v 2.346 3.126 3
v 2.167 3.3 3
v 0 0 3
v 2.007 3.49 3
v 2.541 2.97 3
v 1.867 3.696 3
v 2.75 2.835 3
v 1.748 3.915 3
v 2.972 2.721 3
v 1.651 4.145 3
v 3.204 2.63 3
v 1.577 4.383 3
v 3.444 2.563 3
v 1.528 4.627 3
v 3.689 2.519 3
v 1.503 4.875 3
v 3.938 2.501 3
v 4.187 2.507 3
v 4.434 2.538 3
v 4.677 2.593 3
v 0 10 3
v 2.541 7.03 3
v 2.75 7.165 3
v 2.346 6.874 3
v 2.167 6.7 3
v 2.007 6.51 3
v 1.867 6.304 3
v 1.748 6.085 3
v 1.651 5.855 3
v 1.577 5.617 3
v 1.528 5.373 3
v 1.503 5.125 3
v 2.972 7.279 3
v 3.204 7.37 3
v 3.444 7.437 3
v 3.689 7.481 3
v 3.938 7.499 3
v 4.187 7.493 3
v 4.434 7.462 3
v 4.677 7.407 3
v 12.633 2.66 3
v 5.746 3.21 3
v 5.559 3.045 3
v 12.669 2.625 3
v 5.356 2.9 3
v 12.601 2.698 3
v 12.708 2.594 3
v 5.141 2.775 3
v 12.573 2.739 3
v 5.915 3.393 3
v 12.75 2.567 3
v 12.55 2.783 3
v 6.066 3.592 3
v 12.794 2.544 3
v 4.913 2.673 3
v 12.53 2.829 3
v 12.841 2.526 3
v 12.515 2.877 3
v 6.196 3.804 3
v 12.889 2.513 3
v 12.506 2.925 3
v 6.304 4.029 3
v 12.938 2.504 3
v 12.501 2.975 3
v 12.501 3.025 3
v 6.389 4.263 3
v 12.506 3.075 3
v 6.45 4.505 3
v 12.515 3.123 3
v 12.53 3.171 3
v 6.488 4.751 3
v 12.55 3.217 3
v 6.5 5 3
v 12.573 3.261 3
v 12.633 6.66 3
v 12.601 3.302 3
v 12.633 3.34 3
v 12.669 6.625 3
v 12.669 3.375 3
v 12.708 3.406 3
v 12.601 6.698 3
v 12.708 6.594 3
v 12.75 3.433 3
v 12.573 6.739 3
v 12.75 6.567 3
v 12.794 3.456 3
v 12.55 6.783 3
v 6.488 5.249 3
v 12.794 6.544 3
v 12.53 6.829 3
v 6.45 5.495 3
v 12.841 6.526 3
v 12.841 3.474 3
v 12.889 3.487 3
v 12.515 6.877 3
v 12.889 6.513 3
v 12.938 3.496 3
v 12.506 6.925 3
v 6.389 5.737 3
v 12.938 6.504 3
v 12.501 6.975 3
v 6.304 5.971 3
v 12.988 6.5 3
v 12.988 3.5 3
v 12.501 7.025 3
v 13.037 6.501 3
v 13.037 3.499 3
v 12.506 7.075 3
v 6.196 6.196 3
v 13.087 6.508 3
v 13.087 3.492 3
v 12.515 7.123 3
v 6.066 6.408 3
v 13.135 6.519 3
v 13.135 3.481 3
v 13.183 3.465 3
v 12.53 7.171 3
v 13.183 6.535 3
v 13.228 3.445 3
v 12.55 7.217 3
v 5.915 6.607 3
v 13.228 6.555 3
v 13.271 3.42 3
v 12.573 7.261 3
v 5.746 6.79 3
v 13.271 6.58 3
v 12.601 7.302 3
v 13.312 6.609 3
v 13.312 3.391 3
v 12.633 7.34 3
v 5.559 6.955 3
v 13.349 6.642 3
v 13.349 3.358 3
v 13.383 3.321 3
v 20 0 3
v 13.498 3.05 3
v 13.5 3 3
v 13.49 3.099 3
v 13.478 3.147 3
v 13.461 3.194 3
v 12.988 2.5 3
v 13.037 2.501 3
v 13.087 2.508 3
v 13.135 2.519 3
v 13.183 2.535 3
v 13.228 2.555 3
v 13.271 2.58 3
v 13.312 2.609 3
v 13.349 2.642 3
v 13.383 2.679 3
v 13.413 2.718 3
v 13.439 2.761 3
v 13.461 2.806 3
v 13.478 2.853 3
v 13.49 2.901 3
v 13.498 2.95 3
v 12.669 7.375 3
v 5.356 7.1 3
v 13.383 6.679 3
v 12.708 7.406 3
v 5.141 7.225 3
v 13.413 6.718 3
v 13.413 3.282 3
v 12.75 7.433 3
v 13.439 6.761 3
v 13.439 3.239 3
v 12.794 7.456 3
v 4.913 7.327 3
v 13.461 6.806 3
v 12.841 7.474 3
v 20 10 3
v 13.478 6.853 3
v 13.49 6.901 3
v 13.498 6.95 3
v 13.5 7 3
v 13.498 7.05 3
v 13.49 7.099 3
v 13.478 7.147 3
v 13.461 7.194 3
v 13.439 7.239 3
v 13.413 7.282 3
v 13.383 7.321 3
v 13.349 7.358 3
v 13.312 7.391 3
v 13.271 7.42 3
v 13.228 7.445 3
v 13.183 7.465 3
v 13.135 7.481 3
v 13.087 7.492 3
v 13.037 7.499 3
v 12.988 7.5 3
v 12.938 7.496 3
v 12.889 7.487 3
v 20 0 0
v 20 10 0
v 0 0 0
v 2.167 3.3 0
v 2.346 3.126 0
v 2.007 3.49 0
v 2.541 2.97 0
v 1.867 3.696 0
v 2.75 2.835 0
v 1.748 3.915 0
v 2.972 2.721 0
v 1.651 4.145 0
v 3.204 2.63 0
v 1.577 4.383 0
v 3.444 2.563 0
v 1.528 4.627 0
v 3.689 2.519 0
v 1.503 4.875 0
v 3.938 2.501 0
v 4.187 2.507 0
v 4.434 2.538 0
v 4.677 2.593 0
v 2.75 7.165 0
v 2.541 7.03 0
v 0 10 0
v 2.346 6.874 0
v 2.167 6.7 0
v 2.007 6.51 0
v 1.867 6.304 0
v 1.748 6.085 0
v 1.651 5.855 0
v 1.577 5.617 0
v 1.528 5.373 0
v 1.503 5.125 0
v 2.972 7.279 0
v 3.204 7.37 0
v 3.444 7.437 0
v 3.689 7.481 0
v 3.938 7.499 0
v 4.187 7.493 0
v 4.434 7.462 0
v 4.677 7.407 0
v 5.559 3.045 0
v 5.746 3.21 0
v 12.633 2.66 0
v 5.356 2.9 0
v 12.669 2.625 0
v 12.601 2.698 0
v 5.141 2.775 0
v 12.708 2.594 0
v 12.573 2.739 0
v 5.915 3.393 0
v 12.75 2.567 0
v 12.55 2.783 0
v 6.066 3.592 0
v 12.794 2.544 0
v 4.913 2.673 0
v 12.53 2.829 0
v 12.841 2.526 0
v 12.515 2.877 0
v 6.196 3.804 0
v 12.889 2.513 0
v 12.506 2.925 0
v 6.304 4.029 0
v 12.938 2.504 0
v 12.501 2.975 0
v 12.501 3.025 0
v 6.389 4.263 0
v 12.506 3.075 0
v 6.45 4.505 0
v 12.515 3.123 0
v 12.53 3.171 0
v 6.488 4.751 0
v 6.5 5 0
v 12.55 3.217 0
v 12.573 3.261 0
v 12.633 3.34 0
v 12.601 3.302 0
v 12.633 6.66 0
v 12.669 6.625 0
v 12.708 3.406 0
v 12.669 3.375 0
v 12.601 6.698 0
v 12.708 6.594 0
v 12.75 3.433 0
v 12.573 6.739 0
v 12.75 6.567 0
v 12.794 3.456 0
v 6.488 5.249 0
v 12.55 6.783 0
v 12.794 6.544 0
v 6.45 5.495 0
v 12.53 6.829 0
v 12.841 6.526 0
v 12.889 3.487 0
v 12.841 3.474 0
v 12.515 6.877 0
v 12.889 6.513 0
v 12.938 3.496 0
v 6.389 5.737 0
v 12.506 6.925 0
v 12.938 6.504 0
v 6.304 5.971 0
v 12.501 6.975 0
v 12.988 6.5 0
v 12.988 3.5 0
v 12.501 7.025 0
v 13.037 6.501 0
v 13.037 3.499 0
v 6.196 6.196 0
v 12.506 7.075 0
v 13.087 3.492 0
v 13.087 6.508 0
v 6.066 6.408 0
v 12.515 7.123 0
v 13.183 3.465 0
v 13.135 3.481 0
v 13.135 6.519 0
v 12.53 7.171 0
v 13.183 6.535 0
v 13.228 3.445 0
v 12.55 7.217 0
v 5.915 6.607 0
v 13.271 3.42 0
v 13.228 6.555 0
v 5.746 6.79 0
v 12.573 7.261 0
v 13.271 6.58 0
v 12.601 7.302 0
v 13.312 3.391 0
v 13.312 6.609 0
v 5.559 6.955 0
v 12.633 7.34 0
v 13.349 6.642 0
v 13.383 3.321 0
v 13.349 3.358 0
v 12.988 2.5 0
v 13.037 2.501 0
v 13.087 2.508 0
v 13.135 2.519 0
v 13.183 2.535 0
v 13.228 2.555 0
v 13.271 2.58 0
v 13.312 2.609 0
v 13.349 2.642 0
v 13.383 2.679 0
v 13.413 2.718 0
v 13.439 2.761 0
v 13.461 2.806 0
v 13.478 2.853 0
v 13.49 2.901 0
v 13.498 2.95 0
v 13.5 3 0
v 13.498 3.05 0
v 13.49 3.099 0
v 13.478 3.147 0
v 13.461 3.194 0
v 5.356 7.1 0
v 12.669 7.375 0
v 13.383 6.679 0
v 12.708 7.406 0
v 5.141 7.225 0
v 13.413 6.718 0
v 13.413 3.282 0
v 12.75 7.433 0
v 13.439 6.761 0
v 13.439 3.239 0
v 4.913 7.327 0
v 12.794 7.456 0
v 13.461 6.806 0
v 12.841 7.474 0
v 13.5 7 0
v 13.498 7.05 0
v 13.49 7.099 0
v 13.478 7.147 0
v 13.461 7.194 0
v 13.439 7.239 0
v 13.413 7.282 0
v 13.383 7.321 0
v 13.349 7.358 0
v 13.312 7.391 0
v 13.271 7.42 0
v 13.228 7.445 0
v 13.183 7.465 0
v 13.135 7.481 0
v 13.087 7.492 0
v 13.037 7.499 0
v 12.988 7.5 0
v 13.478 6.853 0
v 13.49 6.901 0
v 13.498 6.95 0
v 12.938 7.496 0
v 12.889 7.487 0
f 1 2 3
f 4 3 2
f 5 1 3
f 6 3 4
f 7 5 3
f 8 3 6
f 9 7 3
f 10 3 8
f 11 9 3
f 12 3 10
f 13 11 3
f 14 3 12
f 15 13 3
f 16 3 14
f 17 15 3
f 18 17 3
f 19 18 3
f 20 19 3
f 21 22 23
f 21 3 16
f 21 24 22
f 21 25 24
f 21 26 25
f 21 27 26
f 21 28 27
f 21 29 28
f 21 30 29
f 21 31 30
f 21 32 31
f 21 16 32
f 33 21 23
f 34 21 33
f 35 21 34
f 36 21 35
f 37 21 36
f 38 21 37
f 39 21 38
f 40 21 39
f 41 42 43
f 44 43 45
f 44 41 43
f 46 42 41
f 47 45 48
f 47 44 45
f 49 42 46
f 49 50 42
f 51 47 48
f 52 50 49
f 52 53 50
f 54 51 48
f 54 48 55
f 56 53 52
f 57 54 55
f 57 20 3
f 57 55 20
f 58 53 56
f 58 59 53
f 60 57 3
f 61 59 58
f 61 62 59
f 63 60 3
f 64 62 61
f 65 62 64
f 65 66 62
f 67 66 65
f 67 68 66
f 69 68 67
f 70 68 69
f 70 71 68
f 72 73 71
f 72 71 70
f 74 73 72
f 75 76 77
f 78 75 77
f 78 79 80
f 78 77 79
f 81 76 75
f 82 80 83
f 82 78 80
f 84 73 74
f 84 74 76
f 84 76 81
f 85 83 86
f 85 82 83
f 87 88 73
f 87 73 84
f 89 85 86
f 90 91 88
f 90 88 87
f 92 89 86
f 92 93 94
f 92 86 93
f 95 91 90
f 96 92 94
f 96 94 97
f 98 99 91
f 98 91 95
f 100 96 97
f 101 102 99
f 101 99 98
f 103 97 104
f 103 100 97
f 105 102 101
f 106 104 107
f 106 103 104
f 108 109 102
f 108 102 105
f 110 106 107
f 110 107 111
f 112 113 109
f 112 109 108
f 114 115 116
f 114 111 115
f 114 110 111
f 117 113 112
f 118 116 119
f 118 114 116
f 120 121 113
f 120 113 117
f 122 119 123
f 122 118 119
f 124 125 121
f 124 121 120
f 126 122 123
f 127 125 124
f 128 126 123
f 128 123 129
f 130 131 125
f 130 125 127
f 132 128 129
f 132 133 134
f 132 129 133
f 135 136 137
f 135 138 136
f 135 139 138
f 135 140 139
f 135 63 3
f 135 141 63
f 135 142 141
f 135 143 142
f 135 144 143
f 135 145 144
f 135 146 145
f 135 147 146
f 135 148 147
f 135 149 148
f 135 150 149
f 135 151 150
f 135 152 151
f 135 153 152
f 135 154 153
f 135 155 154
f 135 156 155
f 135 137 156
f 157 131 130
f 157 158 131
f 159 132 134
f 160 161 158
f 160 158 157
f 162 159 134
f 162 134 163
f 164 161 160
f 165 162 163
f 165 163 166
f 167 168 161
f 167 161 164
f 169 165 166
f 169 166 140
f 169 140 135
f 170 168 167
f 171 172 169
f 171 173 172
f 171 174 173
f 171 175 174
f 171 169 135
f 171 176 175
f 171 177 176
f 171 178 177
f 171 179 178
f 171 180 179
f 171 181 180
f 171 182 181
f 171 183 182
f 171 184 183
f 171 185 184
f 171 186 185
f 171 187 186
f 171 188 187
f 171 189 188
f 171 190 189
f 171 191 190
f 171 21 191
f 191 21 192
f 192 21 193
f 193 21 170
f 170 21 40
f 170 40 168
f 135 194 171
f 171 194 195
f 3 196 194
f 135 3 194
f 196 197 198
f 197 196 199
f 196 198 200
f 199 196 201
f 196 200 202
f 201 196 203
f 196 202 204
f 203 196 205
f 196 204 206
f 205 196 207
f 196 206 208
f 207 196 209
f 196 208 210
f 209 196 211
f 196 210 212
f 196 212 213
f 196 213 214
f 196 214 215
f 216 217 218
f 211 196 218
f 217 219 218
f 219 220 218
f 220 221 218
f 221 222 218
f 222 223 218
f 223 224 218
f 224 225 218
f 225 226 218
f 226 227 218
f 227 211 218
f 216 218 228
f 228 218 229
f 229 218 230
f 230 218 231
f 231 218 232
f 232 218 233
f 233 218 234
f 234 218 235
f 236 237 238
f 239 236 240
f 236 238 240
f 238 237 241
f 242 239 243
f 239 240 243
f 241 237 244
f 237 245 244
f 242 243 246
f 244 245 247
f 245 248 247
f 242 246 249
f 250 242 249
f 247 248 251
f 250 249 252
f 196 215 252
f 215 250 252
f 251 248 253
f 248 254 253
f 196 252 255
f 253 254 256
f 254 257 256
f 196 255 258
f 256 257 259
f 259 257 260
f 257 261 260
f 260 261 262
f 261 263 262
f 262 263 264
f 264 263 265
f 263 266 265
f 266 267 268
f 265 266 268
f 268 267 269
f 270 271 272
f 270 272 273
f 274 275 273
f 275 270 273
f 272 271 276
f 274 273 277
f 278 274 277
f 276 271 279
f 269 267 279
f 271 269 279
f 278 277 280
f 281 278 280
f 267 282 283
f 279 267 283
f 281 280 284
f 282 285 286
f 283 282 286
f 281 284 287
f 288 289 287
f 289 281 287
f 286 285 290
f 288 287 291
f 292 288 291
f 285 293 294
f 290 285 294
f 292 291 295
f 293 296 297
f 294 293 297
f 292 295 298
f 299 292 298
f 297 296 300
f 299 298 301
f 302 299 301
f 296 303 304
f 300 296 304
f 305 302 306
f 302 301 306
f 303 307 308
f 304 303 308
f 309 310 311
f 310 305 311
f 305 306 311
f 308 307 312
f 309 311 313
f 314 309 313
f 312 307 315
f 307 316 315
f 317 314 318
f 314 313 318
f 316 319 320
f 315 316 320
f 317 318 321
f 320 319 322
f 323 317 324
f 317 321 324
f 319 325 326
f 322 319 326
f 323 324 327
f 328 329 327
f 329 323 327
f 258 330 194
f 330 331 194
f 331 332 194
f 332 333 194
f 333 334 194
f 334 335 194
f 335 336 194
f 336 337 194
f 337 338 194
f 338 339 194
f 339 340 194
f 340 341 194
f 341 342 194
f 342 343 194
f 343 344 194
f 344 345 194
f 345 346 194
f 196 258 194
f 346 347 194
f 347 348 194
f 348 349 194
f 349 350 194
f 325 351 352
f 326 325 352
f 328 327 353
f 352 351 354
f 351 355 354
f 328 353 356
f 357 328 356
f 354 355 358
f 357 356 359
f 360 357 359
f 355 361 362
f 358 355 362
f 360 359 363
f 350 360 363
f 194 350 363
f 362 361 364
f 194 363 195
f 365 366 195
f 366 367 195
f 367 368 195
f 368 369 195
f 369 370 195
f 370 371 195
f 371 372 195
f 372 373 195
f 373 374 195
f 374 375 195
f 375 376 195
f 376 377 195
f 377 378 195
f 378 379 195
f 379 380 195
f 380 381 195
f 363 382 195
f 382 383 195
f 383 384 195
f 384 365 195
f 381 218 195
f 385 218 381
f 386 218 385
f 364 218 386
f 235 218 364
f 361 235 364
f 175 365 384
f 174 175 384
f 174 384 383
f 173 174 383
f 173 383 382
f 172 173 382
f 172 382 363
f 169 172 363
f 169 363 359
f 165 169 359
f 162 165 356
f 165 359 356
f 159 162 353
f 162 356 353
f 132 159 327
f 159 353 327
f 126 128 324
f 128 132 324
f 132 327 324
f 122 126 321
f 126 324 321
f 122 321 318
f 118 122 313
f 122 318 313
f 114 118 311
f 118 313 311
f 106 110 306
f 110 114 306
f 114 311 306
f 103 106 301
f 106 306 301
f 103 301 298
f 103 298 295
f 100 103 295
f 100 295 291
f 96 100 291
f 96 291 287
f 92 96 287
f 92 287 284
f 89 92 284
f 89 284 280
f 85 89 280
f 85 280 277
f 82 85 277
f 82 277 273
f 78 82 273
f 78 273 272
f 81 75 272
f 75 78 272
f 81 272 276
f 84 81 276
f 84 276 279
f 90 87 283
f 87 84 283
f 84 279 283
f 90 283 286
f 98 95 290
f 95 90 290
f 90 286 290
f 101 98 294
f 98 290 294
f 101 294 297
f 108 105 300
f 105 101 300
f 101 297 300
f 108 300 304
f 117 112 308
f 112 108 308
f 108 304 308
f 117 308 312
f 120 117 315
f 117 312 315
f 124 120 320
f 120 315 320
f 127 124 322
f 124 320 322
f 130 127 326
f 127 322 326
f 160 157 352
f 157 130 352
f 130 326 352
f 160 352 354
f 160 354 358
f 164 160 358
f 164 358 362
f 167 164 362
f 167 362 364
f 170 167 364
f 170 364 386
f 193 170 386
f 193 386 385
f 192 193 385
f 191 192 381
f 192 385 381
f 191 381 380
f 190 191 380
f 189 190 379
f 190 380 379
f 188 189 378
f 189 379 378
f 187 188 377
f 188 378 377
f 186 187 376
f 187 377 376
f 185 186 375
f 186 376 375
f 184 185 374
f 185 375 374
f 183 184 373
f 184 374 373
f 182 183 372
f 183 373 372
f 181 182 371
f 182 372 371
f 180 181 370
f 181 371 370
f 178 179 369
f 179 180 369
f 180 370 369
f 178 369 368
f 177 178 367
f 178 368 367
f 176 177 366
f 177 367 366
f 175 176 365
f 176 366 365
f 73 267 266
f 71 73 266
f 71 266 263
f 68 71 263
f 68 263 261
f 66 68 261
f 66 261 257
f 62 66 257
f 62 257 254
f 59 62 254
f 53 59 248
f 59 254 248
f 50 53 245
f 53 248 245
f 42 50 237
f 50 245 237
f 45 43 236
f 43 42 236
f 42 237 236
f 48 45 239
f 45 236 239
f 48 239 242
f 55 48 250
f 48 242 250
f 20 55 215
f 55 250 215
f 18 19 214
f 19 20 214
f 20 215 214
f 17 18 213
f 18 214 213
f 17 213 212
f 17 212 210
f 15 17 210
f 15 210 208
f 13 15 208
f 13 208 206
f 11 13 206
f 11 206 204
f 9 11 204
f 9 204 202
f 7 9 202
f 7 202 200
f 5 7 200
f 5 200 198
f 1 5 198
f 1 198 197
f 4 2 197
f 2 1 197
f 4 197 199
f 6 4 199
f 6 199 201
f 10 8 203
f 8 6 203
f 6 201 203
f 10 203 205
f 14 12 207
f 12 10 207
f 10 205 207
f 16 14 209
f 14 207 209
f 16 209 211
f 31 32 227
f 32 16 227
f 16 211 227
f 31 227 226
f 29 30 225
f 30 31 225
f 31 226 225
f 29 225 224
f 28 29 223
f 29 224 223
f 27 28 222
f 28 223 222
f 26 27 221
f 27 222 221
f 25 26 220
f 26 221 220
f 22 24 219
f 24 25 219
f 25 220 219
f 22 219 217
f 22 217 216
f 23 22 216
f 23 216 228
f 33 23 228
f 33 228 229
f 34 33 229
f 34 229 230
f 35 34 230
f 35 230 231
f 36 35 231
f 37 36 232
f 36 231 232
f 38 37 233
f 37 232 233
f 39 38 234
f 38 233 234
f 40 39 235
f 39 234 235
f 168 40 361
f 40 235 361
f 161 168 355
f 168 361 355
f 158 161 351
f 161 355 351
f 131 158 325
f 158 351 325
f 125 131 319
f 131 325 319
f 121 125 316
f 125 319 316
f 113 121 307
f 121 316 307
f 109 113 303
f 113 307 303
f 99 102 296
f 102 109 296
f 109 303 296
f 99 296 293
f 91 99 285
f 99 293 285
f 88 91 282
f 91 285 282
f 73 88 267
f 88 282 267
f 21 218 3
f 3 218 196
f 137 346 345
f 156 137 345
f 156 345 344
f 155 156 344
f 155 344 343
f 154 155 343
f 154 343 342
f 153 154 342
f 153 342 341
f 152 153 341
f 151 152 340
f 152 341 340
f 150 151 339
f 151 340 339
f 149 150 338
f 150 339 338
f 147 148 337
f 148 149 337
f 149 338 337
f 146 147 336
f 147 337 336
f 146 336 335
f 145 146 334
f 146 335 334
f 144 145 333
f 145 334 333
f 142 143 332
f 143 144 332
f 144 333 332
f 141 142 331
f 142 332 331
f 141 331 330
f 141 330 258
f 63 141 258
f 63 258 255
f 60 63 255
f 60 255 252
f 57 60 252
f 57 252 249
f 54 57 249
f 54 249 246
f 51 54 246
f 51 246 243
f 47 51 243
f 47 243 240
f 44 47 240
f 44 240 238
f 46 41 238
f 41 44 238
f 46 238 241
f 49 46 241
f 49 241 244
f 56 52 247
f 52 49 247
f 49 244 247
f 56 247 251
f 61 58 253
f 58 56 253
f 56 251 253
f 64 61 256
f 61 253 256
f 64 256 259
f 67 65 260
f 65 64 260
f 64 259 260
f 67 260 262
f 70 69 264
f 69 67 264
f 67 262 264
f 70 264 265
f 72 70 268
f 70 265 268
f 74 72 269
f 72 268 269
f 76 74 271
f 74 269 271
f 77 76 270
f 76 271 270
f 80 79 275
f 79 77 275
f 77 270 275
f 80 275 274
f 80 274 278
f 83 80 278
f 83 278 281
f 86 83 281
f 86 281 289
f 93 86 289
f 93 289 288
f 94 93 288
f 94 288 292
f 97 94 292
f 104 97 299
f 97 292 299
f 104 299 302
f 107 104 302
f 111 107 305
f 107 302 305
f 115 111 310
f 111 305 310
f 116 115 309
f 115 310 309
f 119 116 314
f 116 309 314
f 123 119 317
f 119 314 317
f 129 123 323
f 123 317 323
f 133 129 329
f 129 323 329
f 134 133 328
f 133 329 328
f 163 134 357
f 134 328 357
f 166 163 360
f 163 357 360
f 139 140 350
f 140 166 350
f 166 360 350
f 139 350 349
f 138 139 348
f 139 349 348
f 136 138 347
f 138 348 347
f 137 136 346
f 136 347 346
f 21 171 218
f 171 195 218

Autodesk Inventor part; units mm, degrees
ref_plane "YZ Plane" through (0, 0, 0) normal (1, 0, 0) x (0, 1, 0)
ref_plane "XZ Plane" through (0, 0, 0) normal (0, 1, 0) x (-1, 0, 0)
ref_plane "XY Plane" through (0, 0, 0) normal (0, 0, 1) x (1, 0, 0)
sketch "Sketch1" plane through (0, 0, 0) normal (0, 0, 1) x (1, 0, 0)
  line L0 (0, 0) -> (20, 0)
  line L1 (20, 0) -> (20, 10)
  line L2 (20, 10) -> (0, 10)
  line L3 (0, 10) -> (0, 0)
  circle A0 centre (4, 5) radius 2.5
  circle A1 centre (13, 3) radius 0.5
  circle A2 centre (13, 7) radius 0.5
  point P0 (0, 5)
  dimension "d0" = 20
  dimension "d1" = 10
  dimension "d3" = 5
  dimension "d4" = 4
  dimension "d7" = 1
  dimension "d8" = 1
  dimension "d9" = 4
  dimension "d10" = 3
  dimension "d11" = 13
extrude "Extrusión1" add sketch "Sketch1" along normal blind 3
